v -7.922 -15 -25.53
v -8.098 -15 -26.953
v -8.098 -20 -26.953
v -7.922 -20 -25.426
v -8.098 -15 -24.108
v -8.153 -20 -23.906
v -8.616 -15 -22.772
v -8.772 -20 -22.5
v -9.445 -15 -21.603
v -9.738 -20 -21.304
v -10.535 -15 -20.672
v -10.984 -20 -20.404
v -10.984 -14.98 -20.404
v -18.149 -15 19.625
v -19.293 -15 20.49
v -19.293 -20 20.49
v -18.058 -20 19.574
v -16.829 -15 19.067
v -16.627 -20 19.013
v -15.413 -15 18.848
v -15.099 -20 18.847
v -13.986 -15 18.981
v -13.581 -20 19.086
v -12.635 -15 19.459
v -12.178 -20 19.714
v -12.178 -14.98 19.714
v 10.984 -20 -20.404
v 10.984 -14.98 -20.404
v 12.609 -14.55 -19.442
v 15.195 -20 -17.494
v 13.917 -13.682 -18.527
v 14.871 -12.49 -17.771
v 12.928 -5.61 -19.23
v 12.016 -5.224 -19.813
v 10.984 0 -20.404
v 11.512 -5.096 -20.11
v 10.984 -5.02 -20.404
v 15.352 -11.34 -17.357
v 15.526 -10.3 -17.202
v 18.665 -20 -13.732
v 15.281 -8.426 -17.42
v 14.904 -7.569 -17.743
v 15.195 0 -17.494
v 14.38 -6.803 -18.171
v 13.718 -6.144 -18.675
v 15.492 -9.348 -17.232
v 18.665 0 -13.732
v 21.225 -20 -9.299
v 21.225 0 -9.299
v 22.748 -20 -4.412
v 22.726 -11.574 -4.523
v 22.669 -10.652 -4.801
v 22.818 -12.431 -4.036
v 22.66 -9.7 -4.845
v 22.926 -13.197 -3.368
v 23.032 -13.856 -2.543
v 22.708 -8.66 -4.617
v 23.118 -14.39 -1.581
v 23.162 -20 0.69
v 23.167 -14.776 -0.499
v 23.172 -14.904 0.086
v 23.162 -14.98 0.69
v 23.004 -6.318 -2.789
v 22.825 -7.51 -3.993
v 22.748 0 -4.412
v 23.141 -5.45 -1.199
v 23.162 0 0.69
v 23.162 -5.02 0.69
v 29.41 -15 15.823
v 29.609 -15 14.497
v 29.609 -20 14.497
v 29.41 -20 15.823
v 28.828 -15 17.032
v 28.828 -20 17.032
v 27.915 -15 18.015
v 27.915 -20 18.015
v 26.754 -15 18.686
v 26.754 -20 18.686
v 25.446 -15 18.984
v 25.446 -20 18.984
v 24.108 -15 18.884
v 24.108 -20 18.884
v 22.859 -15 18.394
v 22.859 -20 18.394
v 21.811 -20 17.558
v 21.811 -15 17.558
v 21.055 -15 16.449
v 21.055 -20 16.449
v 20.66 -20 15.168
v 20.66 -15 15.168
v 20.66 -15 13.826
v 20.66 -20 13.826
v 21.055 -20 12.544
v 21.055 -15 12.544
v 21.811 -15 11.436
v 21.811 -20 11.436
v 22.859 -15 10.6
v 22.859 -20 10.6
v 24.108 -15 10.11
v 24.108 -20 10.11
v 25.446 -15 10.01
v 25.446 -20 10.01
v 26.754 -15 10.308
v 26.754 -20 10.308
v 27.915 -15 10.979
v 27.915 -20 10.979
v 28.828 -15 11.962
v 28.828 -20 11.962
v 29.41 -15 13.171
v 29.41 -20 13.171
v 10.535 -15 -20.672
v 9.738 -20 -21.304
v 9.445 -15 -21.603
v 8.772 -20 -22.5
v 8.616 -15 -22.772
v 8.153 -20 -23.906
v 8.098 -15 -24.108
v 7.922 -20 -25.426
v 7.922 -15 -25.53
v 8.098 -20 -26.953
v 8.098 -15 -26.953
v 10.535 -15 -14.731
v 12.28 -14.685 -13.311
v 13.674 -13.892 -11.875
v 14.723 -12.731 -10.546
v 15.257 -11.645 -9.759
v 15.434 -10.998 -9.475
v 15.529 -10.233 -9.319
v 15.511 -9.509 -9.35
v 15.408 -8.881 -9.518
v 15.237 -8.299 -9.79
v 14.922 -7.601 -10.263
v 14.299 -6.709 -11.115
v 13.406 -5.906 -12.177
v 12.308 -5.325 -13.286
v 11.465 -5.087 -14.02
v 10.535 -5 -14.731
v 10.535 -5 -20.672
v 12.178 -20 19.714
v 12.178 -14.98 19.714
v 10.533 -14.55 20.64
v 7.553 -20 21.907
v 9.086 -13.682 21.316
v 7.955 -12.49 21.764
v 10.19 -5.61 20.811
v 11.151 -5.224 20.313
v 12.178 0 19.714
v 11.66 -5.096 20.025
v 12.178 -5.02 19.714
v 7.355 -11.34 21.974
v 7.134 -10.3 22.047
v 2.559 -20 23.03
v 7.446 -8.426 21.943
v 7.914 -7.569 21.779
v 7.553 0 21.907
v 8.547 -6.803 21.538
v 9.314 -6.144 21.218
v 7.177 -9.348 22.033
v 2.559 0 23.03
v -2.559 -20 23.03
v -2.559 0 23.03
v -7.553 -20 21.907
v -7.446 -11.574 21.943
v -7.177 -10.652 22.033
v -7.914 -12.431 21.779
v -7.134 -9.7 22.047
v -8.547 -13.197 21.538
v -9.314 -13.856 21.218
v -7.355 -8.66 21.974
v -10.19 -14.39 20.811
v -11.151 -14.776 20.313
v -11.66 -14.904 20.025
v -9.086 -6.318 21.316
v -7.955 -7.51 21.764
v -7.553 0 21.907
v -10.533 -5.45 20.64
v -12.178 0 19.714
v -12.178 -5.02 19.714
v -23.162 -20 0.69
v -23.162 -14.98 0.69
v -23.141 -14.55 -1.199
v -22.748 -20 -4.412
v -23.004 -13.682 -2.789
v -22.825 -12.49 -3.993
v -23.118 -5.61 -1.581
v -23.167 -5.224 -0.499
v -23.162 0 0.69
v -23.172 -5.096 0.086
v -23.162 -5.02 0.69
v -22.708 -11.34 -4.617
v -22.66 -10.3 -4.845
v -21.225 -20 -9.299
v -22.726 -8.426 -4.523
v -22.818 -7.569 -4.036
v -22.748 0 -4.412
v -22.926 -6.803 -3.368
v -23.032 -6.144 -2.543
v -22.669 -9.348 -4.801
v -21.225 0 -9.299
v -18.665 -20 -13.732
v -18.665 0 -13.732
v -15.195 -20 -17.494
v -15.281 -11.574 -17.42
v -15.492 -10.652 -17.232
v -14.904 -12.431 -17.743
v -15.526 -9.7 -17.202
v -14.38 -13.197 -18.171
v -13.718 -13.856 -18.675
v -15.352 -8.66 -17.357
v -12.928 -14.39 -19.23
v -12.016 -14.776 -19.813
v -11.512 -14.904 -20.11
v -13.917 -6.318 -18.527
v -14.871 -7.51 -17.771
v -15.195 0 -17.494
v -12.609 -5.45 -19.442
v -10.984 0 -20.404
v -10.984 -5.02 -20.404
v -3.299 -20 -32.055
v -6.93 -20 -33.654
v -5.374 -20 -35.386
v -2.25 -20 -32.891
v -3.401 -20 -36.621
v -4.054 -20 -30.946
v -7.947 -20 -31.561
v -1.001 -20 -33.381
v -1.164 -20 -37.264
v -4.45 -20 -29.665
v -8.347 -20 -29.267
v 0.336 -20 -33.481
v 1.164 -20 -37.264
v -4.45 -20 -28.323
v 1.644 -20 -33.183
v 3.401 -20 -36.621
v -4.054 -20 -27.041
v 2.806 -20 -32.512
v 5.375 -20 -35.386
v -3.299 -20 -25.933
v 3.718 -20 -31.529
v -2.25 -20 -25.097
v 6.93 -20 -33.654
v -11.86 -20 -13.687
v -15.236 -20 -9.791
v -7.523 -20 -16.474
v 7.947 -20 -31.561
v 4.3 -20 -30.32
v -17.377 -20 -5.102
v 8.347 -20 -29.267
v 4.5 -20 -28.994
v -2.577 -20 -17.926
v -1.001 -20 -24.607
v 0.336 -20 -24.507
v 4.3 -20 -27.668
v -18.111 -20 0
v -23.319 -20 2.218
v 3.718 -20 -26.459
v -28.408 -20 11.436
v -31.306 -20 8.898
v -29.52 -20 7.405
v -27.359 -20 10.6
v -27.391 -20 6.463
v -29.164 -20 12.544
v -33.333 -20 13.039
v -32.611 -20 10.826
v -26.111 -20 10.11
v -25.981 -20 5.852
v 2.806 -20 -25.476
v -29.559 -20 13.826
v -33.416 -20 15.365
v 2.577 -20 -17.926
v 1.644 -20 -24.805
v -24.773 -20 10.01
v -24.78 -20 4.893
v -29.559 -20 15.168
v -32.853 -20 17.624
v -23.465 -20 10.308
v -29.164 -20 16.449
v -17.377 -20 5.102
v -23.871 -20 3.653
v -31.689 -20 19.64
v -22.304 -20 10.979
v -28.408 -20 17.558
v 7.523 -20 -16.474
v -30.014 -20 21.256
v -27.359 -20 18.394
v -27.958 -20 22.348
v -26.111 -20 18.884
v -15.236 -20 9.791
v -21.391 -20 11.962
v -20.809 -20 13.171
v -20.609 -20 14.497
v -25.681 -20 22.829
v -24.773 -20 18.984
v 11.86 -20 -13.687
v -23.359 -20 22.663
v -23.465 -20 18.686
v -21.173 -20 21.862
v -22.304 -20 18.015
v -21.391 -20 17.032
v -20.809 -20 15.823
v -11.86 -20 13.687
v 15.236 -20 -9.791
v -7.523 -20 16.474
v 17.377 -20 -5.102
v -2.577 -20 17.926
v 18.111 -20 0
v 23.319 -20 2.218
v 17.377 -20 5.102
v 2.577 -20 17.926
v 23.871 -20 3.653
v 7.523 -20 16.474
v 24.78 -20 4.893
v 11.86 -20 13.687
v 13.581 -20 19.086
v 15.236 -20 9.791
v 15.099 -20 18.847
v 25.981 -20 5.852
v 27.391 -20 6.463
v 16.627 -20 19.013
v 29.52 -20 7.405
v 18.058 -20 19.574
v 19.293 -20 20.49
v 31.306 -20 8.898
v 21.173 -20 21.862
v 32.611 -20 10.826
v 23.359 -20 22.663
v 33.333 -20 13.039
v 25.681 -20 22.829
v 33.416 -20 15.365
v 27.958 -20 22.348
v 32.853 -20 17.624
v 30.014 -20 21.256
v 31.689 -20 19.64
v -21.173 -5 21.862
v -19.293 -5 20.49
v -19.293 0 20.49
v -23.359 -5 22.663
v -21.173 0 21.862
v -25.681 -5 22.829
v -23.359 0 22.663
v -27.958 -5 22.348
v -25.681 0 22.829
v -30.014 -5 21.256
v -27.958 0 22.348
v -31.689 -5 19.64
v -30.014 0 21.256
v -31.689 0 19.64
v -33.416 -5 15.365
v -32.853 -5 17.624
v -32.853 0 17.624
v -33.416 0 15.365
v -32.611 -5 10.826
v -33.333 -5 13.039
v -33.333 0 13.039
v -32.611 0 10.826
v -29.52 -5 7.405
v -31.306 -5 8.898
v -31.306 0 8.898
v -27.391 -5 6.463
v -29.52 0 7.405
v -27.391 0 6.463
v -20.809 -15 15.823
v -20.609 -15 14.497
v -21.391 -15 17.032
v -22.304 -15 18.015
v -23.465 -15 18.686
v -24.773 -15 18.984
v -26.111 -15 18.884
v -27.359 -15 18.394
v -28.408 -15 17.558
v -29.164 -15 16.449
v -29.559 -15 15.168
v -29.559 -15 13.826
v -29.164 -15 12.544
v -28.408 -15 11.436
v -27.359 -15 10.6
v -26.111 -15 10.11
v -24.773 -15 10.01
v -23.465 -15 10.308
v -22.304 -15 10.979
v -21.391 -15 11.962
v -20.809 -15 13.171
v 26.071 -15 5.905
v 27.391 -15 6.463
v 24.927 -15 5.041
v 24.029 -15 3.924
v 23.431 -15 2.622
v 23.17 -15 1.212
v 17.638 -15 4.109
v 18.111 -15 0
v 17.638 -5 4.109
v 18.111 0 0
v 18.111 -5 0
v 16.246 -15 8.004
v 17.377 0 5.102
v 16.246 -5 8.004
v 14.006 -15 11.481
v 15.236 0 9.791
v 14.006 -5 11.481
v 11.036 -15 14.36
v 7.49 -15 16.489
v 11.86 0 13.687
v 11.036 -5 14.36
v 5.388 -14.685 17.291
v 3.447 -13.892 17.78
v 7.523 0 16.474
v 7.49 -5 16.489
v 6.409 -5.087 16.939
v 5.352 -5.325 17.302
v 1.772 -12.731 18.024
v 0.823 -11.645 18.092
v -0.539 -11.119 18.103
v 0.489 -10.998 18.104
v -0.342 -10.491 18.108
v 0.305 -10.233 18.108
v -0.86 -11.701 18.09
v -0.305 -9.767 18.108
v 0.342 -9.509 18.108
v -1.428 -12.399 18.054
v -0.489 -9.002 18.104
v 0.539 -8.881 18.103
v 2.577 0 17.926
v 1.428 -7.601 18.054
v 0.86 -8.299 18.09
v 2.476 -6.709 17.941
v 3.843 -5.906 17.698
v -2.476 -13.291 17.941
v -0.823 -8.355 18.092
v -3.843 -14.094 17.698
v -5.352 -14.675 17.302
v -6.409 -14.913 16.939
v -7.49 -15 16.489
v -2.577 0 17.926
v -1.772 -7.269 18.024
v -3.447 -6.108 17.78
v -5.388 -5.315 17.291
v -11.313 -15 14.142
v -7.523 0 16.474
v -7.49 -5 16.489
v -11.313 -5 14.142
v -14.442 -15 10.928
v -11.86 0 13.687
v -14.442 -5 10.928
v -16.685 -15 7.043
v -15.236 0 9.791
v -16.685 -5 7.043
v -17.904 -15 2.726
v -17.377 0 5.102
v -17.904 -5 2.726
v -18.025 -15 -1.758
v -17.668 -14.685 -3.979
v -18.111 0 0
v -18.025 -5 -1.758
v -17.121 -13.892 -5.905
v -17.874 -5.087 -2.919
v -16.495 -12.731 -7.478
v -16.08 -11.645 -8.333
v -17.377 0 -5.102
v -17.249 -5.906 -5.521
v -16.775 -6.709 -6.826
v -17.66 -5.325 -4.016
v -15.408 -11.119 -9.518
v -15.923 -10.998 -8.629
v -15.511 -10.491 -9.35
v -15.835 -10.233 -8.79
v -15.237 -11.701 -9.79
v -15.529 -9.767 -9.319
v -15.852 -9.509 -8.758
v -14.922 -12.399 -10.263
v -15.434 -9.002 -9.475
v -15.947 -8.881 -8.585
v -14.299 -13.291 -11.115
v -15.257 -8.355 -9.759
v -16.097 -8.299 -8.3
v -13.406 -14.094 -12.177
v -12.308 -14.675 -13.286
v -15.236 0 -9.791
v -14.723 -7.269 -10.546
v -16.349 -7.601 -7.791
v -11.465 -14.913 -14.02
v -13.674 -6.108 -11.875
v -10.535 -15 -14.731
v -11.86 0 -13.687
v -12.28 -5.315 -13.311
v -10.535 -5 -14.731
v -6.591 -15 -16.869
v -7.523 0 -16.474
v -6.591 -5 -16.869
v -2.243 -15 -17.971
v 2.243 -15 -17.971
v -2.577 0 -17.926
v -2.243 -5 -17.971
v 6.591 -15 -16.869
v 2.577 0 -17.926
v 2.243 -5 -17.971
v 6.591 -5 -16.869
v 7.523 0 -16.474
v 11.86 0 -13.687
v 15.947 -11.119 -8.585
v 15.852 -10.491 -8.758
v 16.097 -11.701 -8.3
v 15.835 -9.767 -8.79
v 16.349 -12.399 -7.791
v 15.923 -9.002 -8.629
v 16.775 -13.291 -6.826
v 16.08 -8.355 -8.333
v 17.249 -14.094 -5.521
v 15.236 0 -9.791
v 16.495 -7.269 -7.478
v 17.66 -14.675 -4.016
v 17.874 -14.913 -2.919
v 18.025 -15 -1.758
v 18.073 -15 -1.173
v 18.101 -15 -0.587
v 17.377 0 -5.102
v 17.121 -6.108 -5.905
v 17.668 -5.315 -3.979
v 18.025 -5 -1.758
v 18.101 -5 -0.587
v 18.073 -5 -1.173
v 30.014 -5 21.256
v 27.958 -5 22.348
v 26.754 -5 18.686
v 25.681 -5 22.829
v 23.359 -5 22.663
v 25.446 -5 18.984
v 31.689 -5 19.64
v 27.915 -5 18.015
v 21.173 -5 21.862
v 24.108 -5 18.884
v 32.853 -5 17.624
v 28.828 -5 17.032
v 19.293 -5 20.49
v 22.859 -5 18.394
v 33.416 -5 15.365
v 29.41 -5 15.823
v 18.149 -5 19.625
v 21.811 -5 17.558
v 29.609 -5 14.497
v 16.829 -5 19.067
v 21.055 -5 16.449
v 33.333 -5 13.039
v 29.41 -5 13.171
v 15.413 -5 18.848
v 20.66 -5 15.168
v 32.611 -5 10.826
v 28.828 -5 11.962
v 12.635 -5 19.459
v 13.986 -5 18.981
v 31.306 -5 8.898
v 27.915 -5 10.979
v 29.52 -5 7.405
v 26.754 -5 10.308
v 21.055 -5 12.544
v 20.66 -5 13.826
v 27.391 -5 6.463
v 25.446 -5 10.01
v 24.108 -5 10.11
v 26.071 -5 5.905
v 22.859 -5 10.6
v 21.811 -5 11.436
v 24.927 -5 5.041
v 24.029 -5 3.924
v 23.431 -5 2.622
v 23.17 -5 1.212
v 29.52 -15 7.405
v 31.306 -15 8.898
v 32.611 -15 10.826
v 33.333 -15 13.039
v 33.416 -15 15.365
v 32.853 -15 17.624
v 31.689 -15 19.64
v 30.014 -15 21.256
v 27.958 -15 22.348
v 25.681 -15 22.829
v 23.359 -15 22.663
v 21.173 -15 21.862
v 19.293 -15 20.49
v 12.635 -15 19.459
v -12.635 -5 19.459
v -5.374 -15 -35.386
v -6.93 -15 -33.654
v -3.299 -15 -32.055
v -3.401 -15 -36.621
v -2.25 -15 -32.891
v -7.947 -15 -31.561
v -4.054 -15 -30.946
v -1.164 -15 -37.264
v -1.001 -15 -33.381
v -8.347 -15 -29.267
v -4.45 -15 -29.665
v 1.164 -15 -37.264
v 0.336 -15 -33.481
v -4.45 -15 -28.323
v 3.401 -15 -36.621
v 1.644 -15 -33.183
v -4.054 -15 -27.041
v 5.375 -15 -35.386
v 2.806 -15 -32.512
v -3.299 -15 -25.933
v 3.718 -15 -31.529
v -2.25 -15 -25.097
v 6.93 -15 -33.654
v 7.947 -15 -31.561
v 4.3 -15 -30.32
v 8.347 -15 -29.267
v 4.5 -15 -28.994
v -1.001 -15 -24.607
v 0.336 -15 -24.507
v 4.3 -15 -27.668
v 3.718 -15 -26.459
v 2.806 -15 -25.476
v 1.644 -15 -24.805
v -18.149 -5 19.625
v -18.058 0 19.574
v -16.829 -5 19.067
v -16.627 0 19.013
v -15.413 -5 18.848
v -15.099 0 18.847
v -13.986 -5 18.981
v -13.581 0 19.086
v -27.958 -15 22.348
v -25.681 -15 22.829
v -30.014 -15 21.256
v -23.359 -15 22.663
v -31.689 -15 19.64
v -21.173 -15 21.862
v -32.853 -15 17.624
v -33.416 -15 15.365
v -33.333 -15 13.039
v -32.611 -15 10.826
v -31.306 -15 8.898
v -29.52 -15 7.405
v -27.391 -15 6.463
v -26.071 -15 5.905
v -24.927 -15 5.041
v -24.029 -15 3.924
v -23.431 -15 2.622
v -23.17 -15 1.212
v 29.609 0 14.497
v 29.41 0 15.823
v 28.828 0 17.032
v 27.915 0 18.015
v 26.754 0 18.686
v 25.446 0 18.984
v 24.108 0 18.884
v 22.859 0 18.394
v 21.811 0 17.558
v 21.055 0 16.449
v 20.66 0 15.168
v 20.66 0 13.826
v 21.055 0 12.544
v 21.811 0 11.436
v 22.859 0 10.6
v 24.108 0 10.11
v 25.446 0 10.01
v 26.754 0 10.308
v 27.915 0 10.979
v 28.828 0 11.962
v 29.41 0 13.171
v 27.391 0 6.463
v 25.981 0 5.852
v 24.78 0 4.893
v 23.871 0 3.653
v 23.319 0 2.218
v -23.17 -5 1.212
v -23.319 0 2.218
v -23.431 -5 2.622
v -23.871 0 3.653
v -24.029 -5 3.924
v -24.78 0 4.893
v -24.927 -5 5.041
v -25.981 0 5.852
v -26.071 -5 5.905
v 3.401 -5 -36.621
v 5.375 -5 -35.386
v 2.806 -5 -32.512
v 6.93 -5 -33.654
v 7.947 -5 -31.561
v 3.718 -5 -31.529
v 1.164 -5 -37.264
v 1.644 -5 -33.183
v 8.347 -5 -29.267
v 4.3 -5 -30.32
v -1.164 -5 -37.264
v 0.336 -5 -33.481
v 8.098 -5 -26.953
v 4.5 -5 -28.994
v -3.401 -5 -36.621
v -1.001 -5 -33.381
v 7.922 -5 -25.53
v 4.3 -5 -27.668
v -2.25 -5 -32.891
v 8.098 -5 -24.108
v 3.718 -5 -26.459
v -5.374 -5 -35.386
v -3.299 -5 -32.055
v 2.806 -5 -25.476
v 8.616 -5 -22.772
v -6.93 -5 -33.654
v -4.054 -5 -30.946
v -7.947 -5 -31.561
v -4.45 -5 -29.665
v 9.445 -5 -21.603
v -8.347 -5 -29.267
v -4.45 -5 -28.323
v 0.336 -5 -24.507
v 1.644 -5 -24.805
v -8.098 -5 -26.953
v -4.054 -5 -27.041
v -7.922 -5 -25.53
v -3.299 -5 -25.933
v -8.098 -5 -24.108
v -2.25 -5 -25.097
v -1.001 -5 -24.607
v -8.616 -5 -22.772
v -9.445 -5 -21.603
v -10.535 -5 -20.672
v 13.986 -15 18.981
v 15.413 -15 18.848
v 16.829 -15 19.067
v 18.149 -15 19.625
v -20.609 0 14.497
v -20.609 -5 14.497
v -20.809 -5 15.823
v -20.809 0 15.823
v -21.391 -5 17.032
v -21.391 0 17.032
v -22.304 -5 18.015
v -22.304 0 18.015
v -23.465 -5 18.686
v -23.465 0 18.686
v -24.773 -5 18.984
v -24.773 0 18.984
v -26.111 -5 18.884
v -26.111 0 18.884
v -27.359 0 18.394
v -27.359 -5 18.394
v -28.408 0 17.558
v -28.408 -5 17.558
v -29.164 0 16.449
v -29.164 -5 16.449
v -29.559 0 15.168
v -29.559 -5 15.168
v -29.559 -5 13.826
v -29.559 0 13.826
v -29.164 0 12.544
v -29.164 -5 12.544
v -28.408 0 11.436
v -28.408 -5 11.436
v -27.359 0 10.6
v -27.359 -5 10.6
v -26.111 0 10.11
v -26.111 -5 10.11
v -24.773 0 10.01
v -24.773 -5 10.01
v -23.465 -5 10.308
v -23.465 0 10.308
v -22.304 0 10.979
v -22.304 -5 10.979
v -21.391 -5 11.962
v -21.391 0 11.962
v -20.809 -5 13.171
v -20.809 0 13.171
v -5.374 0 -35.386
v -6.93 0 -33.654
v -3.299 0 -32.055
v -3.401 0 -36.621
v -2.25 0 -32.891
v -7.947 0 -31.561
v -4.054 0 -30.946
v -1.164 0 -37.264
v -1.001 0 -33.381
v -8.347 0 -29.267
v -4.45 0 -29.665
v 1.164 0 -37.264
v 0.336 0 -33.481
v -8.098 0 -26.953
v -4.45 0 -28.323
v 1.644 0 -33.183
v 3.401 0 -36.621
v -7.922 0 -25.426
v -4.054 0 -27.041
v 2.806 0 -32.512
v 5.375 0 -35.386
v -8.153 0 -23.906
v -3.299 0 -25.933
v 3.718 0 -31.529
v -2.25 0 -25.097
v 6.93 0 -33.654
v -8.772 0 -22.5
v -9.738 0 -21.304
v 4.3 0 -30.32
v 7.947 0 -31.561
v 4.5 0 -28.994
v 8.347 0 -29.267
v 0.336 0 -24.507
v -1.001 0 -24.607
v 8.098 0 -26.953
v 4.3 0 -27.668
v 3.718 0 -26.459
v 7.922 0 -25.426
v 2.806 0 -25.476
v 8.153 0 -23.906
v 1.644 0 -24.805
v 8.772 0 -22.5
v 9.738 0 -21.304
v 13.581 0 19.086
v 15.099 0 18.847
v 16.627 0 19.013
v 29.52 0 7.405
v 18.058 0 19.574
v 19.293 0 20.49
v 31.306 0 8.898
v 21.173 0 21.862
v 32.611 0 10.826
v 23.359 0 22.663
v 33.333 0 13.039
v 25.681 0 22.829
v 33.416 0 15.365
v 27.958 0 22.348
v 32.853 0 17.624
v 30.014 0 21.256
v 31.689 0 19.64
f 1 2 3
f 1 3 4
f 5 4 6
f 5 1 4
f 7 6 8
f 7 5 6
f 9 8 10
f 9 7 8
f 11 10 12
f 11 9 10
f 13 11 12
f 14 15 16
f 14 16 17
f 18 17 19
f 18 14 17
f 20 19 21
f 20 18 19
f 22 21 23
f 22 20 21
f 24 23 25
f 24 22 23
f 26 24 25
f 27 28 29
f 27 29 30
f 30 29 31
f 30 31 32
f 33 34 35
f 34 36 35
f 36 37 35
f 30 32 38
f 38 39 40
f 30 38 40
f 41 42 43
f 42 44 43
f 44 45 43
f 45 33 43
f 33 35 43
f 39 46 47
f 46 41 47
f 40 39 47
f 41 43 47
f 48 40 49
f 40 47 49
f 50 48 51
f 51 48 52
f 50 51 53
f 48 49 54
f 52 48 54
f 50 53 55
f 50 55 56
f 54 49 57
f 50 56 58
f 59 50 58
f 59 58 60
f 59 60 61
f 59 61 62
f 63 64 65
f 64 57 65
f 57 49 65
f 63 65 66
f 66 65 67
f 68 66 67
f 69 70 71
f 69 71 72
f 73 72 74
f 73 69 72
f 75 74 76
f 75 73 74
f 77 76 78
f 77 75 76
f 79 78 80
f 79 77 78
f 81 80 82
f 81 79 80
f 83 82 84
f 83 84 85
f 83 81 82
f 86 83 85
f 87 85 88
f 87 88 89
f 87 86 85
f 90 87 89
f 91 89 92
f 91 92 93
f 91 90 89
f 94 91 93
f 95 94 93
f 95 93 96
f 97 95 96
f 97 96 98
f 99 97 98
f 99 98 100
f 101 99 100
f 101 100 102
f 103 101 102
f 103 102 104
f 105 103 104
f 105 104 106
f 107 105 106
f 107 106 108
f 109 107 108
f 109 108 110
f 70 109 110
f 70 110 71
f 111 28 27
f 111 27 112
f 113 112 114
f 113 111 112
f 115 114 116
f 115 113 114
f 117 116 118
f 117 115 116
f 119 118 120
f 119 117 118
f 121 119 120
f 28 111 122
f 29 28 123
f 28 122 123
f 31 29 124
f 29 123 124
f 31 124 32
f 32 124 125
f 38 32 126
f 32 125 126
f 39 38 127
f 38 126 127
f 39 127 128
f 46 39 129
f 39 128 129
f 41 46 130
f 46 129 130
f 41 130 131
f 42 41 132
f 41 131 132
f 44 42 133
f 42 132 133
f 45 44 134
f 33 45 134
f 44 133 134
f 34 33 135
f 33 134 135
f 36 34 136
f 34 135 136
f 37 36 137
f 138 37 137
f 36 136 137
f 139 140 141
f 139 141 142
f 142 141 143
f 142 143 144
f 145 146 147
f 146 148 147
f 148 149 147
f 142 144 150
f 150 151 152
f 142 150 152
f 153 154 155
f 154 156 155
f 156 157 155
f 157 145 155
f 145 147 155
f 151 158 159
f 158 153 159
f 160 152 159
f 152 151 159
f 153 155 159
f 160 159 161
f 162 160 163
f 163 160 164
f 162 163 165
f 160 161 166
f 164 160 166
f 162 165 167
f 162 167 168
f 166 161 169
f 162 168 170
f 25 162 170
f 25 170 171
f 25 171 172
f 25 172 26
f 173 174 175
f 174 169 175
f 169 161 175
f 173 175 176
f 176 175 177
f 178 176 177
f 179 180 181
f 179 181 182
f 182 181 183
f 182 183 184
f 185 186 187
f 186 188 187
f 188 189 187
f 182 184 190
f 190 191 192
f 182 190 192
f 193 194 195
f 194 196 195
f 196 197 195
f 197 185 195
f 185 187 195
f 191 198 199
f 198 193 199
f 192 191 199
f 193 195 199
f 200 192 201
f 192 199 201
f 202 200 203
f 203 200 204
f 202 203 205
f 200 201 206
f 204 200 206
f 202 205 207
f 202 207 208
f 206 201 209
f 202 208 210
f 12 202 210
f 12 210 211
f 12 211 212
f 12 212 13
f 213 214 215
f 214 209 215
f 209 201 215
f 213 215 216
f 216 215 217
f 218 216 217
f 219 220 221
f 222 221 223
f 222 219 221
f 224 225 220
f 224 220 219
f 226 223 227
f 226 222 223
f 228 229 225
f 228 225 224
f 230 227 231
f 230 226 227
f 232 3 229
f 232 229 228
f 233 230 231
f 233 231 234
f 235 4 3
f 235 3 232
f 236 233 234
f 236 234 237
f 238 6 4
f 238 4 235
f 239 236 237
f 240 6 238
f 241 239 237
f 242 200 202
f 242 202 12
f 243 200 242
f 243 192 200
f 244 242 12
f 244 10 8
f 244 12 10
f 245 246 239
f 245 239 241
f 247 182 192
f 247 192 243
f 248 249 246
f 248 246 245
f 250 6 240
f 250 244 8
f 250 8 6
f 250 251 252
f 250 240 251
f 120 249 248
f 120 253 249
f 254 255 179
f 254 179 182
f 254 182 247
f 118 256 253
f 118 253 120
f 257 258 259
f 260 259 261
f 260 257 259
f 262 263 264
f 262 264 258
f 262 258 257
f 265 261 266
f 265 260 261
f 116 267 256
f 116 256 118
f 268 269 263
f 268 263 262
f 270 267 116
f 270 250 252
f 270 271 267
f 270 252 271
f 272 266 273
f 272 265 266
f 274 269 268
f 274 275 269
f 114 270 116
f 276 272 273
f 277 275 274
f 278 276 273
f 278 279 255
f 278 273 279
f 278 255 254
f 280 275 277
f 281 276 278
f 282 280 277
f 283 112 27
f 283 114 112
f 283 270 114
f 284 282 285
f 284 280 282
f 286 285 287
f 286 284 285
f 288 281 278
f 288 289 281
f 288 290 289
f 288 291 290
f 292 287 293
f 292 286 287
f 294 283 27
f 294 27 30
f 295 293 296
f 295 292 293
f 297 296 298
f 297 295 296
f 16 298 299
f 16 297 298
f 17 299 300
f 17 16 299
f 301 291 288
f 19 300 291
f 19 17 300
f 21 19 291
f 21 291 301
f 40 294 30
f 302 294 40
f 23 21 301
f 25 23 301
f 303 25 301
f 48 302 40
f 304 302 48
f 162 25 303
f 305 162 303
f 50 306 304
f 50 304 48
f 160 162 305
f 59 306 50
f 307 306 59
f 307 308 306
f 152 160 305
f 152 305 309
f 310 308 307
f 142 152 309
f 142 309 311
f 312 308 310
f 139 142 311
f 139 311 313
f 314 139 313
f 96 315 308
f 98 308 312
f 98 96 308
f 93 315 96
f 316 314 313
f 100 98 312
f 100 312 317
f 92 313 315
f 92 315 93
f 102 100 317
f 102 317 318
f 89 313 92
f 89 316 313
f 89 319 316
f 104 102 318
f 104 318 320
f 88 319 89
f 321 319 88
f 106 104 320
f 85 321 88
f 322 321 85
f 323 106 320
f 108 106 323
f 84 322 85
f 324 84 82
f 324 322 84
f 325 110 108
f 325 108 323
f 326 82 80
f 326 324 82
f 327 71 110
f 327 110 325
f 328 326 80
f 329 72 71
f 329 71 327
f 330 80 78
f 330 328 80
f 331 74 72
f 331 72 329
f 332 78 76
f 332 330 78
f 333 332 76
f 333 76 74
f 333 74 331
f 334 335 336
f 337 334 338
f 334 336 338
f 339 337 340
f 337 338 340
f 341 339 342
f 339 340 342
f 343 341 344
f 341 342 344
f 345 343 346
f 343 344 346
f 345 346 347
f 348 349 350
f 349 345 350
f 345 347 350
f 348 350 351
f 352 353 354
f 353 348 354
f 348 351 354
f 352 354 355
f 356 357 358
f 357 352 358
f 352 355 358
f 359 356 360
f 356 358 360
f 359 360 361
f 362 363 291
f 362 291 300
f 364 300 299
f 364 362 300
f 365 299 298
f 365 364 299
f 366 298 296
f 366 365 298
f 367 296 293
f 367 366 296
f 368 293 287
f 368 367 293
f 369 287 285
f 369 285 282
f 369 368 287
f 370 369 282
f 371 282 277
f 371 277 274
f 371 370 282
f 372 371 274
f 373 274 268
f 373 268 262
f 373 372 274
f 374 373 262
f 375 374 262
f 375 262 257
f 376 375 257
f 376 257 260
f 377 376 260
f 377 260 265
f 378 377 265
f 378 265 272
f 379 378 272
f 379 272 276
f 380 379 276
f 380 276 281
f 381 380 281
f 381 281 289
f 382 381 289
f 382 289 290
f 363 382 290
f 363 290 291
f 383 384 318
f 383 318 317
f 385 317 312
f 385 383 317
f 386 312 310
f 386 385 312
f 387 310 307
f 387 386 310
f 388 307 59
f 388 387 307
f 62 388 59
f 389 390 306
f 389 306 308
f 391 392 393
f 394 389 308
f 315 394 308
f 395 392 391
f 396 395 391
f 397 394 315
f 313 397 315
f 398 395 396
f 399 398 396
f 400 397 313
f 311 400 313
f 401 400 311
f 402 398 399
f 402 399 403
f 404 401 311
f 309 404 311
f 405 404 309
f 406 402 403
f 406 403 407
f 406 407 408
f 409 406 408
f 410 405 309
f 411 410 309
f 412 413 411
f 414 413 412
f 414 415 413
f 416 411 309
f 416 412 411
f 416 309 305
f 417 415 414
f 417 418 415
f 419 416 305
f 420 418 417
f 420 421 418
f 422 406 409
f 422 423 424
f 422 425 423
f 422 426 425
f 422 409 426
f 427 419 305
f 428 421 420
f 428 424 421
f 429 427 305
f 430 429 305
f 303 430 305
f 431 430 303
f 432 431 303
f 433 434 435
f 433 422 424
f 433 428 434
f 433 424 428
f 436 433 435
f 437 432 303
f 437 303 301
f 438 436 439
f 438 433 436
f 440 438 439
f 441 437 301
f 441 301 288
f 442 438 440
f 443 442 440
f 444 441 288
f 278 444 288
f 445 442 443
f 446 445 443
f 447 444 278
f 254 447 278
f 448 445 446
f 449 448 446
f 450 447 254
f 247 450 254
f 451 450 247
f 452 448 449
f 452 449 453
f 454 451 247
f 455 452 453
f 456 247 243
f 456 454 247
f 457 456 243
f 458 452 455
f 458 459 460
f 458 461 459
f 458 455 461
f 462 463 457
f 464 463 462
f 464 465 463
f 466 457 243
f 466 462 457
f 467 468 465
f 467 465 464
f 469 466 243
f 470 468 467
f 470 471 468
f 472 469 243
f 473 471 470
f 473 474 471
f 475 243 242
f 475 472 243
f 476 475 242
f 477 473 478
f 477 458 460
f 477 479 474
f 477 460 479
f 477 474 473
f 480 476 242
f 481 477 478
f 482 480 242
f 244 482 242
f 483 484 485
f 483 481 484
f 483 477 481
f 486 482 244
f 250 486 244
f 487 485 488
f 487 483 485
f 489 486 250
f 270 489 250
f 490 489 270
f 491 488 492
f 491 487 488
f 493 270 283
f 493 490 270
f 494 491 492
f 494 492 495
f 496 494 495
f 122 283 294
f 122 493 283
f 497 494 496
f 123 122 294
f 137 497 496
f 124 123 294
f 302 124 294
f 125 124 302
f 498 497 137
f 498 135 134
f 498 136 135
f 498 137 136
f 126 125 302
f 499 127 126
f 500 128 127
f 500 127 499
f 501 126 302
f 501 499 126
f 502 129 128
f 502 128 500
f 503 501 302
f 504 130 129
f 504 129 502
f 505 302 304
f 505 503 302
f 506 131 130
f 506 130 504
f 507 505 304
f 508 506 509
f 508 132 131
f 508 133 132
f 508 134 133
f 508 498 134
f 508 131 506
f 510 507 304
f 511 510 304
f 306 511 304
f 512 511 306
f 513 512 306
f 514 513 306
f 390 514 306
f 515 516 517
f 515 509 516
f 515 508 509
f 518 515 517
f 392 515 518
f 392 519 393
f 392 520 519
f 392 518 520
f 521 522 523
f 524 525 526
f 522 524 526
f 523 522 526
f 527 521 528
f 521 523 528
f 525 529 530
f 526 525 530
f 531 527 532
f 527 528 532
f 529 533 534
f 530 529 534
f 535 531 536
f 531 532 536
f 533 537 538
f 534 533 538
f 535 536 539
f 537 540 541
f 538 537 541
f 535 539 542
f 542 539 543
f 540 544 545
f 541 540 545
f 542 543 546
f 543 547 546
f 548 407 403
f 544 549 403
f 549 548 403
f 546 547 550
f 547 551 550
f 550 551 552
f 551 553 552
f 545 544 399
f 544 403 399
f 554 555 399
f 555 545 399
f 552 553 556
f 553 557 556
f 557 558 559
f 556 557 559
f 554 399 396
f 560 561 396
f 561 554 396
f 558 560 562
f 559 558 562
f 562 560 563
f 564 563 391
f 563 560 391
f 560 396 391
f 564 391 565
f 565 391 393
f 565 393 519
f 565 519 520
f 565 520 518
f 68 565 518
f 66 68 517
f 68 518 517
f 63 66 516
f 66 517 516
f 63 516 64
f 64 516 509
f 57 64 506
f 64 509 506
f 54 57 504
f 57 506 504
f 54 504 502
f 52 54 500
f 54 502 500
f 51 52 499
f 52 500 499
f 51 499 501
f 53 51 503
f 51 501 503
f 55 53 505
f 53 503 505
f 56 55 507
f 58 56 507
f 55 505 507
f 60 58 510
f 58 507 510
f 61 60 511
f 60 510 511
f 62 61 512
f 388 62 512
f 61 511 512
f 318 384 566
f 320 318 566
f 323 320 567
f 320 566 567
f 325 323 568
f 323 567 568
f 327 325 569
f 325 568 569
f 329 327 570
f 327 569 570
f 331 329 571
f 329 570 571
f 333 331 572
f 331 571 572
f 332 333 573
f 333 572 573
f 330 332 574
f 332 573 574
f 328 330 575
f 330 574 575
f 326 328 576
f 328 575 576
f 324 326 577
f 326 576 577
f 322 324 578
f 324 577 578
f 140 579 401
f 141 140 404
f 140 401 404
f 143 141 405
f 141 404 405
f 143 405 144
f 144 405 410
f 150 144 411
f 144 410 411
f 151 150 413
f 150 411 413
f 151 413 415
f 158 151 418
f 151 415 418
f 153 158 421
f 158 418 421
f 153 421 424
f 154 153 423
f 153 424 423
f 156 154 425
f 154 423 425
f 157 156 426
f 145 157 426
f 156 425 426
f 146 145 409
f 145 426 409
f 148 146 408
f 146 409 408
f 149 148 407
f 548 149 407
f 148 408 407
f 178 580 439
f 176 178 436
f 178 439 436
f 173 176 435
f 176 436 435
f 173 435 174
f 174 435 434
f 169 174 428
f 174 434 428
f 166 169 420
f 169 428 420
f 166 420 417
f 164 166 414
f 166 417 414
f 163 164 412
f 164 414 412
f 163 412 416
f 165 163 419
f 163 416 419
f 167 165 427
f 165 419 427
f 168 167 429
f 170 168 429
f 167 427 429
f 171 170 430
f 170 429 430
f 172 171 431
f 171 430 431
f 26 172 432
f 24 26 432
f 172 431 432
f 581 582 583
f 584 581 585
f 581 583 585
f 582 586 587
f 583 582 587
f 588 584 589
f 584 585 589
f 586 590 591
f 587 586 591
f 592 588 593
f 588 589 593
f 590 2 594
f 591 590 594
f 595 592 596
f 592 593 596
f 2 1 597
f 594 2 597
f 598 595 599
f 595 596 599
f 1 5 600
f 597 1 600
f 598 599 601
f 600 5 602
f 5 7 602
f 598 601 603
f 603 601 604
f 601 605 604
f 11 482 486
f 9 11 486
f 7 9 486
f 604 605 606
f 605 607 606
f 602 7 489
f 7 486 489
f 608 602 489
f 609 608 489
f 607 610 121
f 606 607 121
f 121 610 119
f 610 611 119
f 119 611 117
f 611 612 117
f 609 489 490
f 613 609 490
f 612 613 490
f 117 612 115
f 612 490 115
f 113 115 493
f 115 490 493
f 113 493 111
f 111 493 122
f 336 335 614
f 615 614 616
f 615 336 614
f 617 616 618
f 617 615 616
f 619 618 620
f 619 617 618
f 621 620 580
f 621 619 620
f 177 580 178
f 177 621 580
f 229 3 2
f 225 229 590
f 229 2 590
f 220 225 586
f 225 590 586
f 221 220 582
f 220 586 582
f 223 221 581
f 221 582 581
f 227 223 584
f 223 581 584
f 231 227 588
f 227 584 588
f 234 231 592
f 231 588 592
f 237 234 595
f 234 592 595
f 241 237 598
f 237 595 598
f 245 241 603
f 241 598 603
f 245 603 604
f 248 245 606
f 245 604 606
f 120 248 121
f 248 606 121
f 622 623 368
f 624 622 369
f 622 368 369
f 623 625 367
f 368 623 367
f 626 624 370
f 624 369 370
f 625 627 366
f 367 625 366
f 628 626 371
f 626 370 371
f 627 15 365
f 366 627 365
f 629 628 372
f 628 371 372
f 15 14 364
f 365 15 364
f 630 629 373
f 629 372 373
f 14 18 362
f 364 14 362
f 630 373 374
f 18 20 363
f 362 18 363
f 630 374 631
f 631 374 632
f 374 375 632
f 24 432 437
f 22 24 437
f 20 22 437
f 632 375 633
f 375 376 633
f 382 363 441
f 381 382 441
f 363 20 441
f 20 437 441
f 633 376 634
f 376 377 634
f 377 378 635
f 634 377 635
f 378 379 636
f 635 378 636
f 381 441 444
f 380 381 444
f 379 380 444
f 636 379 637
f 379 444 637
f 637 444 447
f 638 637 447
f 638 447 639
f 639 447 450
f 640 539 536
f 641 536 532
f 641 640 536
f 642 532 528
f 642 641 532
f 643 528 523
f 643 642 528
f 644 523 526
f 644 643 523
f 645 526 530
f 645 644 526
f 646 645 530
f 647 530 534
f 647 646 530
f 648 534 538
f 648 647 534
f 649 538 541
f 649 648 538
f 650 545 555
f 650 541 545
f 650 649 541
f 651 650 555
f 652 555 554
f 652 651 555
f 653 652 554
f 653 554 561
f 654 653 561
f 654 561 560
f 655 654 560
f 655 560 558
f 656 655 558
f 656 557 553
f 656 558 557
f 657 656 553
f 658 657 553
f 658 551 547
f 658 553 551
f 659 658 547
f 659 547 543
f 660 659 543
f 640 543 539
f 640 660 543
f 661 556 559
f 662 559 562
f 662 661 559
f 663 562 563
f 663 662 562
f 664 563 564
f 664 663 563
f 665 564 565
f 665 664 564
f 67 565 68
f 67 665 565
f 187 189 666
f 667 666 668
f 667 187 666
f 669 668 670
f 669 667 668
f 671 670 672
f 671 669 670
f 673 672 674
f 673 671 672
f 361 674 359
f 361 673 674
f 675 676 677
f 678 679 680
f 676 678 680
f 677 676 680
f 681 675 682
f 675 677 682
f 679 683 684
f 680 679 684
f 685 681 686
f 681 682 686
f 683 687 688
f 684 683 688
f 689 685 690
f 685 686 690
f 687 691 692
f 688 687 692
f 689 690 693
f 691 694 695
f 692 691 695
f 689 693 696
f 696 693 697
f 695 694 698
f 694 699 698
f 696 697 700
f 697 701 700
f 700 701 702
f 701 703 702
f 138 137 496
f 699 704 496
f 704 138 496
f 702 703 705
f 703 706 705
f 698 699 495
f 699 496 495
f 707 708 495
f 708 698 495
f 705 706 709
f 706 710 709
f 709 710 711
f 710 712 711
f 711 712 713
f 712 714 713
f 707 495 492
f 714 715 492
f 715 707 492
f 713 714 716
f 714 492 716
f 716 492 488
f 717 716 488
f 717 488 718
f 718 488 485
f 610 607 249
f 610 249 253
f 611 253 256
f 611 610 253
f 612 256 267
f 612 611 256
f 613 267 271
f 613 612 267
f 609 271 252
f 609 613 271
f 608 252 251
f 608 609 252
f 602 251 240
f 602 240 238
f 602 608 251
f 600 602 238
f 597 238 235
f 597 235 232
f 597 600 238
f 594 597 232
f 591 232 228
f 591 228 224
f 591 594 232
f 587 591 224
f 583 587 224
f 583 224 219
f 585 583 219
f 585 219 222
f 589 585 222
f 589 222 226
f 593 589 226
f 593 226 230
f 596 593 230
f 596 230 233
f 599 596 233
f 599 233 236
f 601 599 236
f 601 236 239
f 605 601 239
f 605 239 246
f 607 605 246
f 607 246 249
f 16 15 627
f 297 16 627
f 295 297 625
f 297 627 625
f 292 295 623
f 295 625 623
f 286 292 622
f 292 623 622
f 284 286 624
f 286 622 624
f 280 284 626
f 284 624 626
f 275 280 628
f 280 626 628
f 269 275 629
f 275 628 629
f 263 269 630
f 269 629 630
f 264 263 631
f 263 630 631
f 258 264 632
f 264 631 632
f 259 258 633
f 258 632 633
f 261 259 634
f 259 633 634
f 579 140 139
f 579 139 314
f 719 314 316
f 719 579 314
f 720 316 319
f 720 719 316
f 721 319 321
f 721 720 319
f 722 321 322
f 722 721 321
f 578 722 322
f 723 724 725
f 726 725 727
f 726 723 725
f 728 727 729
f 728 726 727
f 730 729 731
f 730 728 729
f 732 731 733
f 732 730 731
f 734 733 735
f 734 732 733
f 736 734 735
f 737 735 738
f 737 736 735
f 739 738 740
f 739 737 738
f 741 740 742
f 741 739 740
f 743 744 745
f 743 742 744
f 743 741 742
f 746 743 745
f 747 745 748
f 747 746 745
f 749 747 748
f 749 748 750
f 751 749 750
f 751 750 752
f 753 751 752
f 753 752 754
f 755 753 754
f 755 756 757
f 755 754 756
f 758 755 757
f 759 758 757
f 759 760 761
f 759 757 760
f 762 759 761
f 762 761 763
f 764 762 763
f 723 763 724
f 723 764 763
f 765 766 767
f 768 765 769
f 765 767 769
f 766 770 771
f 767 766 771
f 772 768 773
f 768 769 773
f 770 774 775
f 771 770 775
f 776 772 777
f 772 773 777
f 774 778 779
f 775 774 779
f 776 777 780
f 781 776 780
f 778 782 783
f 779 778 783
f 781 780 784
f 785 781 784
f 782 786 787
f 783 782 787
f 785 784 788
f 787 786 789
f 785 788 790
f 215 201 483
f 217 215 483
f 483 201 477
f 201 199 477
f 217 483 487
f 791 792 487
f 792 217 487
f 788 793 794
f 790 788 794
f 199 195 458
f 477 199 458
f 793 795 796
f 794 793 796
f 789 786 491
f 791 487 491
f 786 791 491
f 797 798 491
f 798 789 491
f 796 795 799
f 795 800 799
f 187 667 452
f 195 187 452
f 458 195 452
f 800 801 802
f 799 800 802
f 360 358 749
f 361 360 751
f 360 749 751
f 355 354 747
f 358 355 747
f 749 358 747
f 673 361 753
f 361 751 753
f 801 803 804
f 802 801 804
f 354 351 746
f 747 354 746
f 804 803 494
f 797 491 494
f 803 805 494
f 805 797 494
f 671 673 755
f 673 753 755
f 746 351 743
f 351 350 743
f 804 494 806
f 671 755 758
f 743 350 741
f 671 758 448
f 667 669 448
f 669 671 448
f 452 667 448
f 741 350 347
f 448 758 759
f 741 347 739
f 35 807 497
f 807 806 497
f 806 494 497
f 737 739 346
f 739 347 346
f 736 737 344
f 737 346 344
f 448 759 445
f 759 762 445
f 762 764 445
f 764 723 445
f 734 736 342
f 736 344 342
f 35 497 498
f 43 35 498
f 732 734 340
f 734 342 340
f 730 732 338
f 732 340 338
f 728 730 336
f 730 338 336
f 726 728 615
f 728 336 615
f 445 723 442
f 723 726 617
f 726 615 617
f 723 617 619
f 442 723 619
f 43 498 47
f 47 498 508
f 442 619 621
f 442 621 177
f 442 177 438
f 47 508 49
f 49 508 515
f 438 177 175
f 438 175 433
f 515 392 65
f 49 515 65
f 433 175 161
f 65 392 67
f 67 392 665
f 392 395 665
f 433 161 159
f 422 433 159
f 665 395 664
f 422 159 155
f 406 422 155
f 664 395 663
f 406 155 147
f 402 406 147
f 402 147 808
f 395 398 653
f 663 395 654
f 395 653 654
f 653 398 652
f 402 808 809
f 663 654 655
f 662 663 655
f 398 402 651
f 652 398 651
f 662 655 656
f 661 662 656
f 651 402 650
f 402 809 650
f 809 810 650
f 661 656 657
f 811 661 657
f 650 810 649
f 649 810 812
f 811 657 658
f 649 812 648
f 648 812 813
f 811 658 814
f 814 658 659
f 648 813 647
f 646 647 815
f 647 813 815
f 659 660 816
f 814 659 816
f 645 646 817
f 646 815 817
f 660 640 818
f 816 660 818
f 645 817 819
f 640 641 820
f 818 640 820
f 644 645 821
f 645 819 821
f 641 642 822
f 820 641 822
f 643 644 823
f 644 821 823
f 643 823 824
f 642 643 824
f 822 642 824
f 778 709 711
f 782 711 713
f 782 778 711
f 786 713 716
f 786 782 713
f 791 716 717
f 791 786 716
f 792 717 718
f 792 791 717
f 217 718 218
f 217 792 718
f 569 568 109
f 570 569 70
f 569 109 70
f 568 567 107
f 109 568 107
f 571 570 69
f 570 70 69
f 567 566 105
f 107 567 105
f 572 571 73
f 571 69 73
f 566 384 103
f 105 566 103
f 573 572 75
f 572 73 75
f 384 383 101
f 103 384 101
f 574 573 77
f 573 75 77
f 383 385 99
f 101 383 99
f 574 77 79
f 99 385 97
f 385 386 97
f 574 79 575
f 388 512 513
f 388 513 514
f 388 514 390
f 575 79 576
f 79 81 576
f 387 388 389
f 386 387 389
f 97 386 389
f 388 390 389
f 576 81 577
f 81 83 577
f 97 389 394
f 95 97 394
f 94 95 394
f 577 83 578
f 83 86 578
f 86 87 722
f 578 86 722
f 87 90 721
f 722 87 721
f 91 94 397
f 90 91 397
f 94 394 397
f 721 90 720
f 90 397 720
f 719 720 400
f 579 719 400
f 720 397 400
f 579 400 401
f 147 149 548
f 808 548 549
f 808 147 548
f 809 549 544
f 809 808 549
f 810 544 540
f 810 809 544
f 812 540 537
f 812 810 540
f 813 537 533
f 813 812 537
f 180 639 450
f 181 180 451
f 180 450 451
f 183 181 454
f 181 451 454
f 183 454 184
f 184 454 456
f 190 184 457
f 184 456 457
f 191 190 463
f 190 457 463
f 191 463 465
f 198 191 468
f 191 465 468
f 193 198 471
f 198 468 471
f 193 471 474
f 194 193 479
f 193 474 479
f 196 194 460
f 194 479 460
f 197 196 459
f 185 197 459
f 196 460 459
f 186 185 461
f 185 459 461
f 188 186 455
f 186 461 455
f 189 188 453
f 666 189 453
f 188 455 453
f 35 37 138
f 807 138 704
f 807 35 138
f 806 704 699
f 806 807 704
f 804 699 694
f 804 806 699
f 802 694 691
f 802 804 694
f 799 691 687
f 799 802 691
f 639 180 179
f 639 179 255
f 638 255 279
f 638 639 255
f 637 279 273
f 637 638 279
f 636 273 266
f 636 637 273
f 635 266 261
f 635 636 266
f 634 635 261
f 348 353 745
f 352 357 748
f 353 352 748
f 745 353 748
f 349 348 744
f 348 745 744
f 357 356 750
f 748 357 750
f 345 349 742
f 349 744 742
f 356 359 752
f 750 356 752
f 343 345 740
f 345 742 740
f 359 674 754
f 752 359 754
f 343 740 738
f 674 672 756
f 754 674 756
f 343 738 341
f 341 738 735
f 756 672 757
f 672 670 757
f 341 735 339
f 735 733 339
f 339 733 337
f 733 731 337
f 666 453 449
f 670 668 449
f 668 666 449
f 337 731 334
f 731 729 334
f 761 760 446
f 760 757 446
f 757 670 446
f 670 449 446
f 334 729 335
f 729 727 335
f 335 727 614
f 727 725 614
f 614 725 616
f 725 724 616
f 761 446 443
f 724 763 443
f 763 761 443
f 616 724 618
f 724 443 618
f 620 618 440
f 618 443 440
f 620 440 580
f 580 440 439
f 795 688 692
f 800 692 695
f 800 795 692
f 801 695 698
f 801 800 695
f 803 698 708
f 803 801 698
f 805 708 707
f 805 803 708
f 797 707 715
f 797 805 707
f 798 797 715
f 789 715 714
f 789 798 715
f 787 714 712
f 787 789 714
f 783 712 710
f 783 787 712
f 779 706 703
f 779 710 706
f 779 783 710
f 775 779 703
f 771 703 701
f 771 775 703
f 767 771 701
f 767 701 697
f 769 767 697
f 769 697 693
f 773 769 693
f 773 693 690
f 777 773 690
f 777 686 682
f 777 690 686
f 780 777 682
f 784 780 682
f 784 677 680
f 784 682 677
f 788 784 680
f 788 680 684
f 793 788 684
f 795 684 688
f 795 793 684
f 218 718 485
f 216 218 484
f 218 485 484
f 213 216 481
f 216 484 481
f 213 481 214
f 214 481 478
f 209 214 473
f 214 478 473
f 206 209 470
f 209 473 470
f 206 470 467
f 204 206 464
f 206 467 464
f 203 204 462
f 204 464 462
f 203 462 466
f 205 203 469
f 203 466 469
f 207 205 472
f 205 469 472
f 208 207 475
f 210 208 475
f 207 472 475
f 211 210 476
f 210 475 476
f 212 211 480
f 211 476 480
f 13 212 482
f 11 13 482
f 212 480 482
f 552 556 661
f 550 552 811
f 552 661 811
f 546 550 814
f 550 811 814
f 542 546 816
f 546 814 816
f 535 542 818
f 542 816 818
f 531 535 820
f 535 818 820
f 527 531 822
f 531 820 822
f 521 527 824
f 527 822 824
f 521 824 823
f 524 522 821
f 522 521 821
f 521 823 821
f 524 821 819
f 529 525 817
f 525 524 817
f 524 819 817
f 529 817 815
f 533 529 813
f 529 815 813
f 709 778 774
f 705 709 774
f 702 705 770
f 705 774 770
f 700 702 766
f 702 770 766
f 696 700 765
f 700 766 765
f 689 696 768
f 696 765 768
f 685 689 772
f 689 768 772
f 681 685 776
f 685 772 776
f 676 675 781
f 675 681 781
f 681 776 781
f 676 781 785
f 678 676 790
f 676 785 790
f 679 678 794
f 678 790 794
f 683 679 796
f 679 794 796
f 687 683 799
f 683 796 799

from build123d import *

# Parameters (mm, degrees)
SKETCH_R           = 4.5
SKETCH_R_2         = 18.110743
PAD_DEPTH          = 20
POCKET_DEPTH       = 60
POLARPATTERN_COUNT = 3


with BuildPart() as part:
    # Sketch → Pad (new body)
    with BuildSketch(Plane.XZ):
        with BuildLine():
            ThreePointArc((12.178111, 19.713984), (0, 23.172129), (-12.178111, 19.713984))
            ThreePointArc((-19.292673, 20.489517), (-15.868632, 18.879438), (-12.178111, 19.713984))
            ThreePointArc((-19.292673, 20.489517), (-32.342002, 18.672663), (-27.390779, 6.463187))
            ThreePointArc((-23.161867, 0.689562), (-24.284389, 4.302919), (-27.390779, 6.463187))
            ThreePointArc((-23.161867, 0.689562), (-20.067652, -11.586065), (-10.983754, -20.403546))
            ThreePointArc((-8.098105, -26.952707), (-8.415755, -23.18236), (-10.983754, -20.403546))
            ThreePointArc((-8.098105, -26.952707), (3e-06, -37.345325), (8.098106, -26.952703))
            ThreePointArc((10.983755, -20.403546), (8.415757, -23.182358), (8.098106, -26.952703))
            ThreePointArc((10.983755, -20.403546), (20.067652, -11.586065), (23.161867, 0.689562))
            ThreePointArc((27.390779, 6.463187), (24.284389, 4.302919), (23.161867, 0.689562))
            ThreePointArc((27.390779, 6.463187), (32.342001, 18.672663), (19.292673, 20.489517))
            ThreePointArc((12.178111, 19.713984), (15.868632, 18.879438), (19.292673, 20.489517))
        make_face()
        with Locations((-25.109476, 14.496963)):
            Circle(SKETCH_R, mode=Mode.SUBTRACT)
        with Locations((25.109476, 14.496963)):
            Circle(SKETCH_R, mode=Mode.SUBTRACT)
        with Locations((1e-06, -28.993925)):
            Circle(SKETCH_R, mode=Mode.SUBTRACT)
        Circle(SKETCH_R_2, mode=Mode.SUBTRACT)
    extrude(amount=PAD_DEPTH)

    # Sketch001 → Pocket (cut)
    with BuildSketch(Plane.XY):
        with BuildLine():
            ThreePointArc((-10.534883, -5), (-15.534883, -10), (-10.534883, -15))
            Line((-10.534883, -15), (10.534883, -15))
            ThreePointArc((10.534883, -15), (15.534883, -10), (10.534883, -5))
            Line((10.534883, -5), (-10.534883, -5))
        make_face()
    pocket = extrude(amount=-POCKET_DEPTH, mode=Mode.SUBTRACT)

    # PolarPattern: Pocket ×3 about axis
    polarpattern_axis = Axis((0, 0, 0), (0, 1, 0))
    for i in range(1, POLARPATTERN_COUNT):
        add(pocket.rotate(polarpattern_axis, i * 360 / POLARPATTERN_COUNT), mode=Mode.SUBTRACT)


solid = part.part
